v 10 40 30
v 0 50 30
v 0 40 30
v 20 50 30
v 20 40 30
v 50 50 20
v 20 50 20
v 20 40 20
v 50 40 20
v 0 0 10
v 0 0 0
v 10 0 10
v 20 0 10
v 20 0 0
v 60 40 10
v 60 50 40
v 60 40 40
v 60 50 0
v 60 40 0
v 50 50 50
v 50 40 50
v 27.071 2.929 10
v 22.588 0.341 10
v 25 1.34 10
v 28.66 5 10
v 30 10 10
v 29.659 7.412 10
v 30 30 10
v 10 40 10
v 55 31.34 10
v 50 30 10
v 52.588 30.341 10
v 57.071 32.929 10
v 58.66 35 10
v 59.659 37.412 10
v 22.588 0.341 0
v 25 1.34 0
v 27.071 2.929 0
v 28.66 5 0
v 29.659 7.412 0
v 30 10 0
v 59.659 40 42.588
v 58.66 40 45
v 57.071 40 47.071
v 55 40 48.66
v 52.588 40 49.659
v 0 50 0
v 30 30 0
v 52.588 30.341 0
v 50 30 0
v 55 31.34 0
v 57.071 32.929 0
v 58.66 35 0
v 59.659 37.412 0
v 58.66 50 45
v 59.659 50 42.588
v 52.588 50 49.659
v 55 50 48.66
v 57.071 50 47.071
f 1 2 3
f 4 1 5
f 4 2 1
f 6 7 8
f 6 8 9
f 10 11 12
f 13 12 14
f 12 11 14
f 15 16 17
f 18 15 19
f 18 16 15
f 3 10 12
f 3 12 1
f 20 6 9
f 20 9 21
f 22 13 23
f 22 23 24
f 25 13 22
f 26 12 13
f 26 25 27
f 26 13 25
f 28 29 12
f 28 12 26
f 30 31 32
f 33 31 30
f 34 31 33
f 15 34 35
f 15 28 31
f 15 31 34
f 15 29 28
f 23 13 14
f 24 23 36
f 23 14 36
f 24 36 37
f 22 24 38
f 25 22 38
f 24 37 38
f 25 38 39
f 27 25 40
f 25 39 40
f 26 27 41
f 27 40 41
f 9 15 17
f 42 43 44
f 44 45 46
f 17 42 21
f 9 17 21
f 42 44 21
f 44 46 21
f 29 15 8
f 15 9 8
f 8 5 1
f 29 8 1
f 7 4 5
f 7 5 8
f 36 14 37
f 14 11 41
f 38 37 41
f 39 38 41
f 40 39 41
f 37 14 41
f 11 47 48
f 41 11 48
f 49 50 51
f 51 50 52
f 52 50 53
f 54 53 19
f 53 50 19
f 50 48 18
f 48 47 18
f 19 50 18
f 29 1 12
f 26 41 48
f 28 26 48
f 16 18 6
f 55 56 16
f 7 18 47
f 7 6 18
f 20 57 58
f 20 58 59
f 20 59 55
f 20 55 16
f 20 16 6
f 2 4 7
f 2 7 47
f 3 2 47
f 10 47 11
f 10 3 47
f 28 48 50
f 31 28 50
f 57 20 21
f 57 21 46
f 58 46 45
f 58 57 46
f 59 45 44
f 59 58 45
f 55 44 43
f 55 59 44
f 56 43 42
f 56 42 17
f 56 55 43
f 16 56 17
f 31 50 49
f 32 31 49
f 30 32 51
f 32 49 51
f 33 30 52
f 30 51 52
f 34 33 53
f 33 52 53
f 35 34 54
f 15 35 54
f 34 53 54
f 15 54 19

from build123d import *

# Parameters (mm, degrees)
F1_DEPTH = 10
F3_DEPTH = 10
F5_DEPTH = 10


with BuildPart() as f1:
    # F0 (on Top) → F1 (new body)
    with BuildSketch(Plane.XY):
        with BuildLine():
            Line((0, 50), (0, 0))
            Line((0, 0), (20, 0))
            ThreePointArc((20, 0), (27.071068, 2.928932), (30, 10))
            Line((30, 10), (30, 30))
            Line((30, 30), (50, 30))
            ThreePointArc((50, 30), (57.071068, 32.928932), (60, 40))
            Line((60, 40), (60, 50))
            Line((60, 50), (0, 50))
        make_face()
    extrude(amount=F1_DEPTH)

    # F2 (on face) → F3 (join)
    with BuildSketch(Plane(origin=(0, 50, 0), x_dir=(-1, 0, 0), z_dir=(0, 1, 0))):
        with BuildLine():
            Line((-60, 10), (0, 10))
            Line((0, 10), (0, 30))
            Line((0, 30), (-20, 30))
            Line((-20, 30), (-20, 20))
            Line((-20, 20), (-50, 20))
            Line((-50, 20), (-50, 50))
            ThreePointArc((-50, 50), (-57.071068, 47.071068), (-60, 40))
            Line((-60, 40), (-60, 10))
        make_face()
    extrude(amount=-F3_DEPTH)

    # F4 (on face) → F5 (join)
    with BuildSketch(Plane(origin=(0, 0, 0), x_dir=(0, -1, 0), z_dir=(-1, 0, 0))):
        Polygon((0, 10), (-40, 30), (-40, 10), align=None)
    extrude(amount=-F5_DEPTH)


solid = f1.part
